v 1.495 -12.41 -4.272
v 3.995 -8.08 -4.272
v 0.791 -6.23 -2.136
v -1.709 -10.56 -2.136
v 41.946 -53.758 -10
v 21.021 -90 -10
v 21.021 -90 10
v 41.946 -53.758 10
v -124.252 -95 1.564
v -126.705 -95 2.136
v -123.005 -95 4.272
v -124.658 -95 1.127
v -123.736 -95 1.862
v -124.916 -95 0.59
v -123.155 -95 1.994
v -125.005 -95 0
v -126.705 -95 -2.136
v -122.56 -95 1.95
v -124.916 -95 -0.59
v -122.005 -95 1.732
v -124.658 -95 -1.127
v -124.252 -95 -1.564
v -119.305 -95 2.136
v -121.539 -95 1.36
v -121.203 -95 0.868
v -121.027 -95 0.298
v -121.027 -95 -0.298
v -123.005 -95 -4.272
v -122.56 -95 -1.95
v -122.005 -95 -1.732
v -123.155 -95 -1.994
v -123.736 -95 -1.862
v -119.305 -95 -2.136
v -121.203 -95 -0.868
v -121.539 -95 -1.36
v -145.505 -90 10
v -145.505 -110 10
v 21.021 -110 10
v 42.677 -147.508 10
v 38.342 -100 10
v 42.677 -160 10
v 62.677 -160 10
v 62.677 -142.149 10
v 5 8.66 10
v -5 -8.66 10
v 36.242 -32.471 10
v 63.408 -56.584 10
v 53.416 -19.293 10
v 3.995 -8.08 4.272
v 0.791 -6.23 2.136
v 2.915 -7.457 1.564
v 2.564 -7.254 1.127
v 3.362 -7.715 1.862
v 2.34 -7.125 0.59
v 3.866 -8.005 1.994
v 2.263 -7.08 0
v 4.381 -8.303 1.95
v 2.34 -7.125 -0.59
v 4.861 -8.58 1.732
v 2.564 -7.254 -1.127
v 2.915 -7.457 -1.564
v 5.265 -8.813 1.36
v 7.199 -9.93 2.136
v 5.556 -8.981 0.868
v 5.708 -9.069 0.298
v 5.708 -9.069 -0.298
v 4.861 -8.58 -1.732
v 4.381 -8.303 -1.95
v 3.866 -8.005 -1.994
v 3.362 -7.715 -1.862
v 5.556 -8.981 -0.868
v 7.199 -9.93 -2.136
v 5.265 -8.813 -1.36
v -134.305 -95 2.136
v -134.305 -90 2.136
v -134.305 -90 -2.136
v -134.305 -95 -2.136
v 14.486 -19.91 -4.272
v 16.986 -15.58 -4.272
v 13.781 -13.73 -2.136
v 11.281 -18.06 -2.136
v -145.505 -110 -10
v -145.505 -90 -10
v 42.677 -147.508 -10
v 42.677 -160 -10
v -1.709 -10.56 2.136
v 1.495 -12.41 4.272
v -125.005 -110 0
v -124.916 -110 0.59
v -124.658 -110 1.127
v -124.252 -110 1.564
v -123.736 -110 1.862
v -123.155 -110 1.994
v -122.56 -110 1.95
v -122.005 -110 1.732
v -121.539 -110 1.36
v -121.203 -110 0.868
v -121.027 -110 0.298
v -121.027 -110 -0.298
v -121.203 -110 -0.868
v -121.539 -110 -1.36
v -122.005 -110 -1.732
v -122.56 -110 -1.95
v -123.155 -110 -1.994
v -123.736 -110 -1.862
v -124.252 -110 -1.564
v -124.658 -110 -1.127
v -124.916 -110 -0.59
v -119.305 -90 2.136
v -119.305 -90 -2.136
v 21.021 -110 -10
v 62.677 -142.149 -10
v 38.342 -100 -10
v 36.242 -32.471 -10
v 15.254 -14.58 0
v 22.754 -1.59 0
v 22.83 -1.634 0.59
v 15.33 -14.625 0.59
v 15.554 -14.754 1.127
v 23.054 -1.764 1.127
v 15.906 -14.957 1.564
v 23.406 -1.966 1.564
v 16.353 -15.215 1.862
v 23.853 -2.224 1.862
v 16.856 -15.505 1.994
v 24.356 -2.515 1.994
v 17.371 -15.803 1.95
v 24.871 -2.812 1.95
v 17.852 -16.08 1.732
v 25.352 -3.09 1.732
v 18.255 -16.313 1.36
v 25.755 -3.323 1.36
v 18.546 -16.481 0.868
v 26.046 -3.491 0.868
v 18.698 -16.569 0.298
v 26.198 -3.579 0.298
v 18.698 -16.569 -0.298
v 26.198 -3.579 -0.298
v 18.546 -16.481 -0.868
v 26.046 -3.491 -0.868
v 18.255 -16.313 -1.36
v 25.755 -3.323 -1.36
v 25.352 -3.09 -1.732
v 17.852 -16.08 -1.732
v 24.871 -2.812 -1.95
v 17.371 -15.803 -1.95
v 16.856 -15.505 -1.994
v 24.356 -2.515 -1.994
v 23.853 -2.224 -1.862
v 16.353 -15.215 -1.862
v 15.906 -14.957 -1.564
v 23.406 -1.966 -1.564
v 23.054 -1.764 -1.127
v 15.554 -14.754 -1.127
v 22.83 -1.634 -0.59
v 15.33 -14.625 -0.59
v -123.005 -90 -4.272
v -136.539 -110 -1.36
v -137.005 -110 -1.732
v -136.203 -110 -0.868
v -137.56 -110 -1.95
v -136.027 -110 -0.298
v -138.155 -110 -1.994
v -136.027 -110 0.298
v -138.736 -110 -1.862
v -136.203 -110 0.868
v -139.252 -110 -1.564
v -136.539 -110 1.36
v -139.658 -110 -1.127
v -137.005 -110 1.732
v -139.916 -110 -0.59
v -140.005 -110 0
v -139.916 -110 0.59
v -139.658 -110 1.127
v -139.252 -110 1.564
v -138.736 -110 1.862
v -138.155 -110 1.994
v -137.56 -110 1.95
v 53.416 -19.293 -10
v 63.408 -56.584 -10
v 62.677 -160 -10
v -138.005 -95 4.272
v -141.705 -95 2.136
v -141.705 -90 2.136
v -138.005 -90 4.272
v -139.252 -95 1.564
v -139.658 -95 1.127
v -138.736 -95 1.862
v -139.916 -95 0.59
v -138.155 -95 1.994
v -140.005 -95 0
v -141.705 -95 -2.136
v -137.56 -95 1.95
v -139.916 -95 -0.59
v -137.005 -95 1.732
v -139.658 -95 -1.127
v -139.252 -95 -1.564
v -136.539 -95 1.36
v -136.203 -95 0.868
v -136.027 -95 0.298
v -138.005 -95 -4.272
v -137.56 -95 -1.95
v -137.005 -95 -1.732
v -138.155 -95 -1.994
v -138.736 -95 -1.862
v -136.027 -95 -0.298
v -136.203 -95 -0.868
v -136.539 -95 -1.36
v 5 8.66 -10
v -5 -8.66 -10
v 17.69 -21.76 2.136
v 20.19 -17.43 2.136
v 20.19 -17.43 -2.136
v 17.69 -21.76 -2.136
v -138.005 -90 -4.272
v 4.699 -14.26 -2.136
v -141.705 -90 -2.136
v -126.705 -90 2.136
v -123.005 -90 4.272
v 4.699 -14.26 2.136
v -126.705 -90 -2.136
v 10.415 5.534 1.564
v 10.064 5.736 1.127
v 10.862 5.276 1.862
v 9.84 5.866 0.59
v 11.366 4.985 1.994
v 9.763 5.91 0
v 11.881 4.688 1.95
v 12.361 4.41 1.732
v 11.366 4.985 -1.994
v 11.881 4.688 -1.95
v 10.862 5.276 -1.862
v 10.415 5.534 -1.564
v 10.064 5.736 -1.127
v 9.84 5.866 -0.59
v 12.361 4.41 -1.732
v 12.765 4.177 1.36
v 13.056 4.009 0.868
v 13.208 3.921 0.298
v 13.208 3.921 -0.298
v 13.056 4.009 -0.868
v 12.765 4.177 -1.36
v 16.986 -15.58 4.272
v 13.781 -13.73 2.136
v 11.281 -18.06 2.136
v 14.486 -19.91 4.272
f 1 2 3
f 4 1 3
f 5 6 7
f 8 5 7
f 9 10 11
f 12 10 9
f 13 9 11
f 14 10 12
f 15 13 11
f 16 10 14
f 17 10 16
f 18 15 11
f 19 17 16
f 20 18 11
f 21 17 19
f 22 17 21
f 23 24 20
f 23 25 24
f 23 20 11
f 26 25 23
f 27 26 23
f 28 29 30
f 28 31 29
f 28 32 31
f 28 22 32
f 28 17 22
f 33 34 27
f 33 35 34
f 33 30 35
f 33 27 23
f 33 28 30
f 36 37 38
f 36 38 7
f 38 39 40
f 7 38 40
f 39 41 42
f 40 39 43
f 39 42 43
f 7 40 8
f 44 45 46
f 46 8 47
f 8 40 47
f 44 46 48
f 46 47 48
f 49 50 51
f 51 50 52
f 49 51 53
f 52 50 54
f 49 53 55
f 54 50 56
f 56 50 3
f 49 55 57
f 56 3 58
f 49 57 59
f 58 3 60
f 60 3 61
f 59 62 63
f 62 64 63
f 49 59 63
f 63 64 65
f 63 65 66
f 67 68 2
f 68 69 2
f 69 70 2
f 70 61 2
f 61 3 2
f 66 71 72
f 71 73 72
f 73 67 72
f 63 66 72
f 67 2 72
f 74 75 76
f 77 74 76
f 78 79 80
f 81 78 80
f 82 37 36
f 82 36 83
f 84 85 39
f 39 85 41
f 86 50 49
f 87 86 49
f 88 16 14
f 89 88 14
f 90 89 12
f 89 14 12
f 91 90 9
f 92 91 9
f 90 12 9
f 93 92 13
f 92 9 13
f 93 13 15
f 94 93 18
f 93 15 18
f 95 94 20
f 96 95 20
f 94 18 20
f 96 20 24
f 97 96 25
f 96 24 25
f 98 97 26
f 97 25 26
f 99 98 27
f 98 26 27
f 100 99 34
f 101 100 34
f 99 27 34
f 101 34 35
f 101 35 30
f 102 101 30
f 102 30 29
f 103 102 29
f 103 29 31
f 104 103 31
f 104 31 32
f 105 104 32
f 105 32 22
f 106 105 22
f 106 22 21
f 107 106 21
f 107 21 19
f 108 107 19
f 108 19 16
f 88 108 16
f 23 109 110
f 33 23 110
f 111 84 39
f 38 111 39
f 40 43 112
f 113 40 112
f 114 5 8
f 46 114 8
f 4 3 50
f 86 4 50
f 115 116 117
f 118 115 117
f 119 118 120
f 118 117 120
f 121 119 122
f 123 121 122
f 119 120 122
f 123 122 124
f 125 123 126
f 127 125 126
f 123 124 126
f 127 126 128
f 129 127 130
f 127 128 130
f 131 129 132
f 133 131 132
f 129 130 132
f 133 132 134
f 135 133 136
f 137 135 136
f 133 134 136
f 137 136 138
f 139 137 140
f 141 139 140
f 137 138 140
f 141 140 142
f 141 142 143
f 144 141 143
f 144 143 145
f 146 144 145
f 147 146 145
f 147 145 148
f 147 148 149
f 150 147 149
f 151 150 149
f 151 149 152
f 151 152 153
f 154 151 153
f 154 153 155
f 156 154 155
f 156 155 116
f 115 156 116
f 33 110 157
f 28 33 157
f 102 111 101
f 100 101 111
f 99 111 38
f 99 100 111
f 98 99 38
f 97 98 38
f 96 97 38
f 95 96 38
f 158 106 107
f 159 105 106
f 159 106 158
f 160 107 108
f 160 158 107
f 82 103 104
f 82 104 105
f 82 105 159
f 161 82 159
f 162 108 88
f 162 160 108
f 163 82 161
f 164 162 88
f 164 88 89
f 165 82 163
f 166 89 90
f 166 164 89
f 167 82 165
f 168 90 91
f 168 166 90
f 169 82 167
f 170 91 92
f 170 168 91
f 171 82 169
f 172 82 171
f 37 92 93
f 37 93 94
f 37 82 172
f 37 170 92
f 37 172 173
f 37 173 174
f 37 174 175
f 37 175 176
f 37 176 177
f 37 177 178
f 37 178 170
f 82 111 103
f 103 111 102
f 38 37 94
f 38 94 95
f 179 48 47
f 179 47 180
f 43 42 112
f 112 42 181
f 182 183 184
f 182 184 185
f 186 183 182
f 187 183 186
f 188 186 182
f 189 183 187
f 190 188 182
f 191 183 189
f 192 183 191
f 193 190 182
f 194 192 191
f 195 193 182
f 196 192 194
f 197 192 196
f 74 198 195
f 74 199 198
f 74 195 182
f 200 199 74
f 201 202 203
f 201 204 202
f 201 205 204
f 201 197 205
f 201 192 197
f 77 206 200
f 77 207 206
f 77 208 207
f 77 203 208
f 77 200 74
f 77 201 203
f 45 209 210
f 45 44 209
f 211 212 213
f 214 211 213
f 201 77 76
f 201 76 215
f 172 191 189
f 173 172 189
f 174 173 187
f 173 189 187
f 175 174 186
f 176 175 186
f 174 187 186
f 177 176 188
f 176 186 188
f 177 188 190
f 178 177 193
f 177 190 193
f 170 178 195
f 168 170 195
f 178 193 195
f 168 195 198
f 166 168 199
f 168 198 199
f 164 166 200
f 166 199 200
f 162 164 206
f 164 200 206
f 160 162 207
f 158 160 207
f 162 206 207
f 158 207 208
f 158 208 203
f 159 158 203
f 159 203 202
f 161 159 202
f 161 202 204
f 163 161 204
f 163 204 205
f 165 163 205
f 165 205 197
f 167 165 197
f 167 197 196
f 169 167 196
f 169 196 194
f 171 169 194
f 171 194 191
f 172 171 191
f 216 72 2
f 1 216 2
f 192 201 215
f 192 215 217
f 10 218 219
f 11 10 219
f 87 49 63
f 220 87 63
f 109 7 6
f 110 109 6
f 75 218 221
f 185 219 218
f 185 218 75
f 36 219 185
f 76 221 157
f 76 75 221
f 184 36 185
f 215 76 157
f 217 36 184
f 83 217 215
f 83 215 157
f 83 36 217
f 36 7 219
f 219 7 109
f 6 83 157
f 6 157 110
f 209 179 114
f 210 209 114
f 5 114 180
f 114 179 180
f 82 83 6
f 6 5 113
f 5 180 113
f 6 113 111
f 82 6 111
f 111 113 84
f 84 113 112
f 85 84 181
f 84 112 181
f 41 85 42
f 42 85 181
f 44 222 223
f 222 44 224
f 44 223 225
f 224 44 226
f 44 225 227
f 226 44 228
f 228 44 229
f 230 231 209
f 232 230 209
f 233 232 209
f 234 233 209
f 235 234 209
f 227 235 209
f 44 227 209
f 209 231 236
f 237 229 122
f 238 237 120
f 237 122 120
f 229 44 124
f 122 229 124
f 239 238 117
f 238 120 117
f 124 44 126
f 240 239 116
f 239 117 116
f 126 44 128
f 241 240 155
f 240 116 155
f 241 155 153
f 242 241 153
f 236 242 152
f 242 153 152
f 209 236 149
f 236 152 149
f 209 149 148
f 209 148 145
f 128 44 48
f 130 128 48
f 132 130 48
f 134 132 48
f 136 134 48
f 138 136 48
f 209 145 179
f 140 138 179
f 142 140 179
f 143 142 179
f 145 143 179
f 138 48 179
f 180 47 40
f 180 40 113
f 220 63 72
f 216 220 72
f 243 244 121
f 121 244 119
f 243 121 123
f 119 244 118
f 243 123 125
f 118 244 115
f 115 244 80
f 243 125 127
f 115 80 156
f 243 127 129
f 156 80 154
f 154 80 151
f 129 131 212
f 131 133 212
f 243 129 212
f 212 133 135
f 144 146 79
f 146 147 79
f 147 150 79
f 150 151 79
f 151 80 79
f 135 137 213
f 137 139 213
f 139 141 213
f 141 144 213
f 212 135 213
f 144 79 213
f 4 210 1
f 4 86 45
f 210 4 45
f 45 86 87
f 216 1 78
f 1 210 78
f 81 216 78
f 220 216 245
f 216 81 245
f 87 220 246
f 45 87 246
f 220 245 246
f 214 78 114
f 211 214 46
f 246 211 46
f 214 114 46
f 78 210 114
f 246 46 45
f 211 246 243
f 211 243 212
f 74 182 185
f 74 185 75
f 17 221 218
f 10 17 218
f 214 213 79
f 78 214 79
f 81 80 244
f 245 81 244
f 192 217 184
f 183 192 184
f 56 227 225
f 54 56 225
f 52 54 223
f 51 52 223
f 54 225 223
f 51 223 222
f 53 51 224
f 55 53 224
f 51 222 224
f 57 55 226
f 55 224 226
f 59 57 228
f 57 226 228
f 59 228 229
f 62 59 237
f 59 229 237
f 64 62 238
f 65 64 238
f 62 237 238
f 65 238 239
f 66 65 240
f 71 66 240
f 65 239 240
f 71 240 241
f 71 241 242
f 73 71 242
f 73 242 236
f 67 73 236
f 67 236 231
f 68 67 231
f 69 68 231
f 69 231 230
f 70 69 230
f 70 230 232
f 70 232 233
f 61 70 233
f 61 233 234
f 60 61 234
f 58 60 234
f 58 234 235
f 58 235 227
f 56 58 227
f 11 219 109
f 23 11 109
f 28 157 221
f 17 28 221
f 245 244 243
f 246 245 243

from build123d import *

# Parameters (mm, degrees)
SKETCH2_W          = 20
SKETCH2_H          = 20
SKETCH4_W          = 20
SKETCH4_H          = 20
CUT_EXTRUDE1_REACH = 228.27
SKETCH5_R          = 2
CUT_EXTRUDE2_START = -15
SKETCH5_3_R        = 2
CUT_EXTRUDE2_DEPTH = 5
CUT_EXTRUDE3_REACH = 204.251
SKETCH6_R          = 2
SKETCH6_5_R        = 2
CUT_EXTRUDE4_DEPTH = 5


with BuildPart() as part:
    # Sweep1: sweep along a path in Sketch1
    with BuildLine(Plane.XY) as sweep1_path:
        Line((0, 0), (44.828773608, -25.88190451))
        Line((44.828773608, -25.88190451), (52.676823753, -55.171226392))
        Line((52.676823753, -55.171226392), (26.794919243, -100))
        Line((26.794919243, -100), (52.676823753, -144.828773608))
        Line((52.676823753, -144.828773608), (52.676823753, -160))
    # Sketch2 → Sweep1 (sweep)
    with BuildSketch(Plane(origin=(0, 0, 0), x_dir=(0, 0, 1), z_dir=(-0.8660254037844382, 0.500000000000001, 0))):
        Rectangle(SKETCH2_W, SKETCH2_H)
    sweep(path=sweep1_path.line, transition=Transition.RIGHT)

    # Sweep3: sweep along a path in Sketch1<5>
    with BuildLine(Plane.XY) as sweep3_path:
        Line((26.794919243, -100), (-145.505080757, -100))
    # Sketch4 → Sweep3 (sweep)
    with BuildSketch(Plane(origin=(-145.505080757, -100, 0), x_dir=(0, 0, 1), z_dir=(-1, 0, 0))):
        Rectangle(SKETCH4_W, SKETCH4_H)
    sweep(path=sweep3_path.line)

    # Sketch5 → Cut-Extrude1 (cut, up to next)
    with BuildSketch(Plane(origin=(5, 8.660254038, 0), x_dir=(0.8660254037844382, -0.500000000000001, 0), z_dir=(0.500000000000001, 0.8660254037844382, 0)), mode=Mode.PRIVATE) as cut_extrude1_sk1:
        with Locations(Location((7.5, 0, 0), (0, 0, 180))):
            Circle(SKETCH5_R)
    cut_extrude1_tool1 = extrude(cut_extrude1_sk1.sketch, amount=-CUT_EXTRUDE1_REACH, mode=Mode.PRIVATE) & part.part
    # Sketch5 → Cut-Extrude1 (cut, up to next)
    with BuildSketch(Plane(origin=(5, 8.660254038, 0), x_dir=(0.8660254037844382, -0.500000000000001, 0), z_dir=(0.500000000000001, 0.8660254037844382, 0)), mode=Mode.PRIVATE) as cut_extrude1_sk2:
        with Locations(Location((22.5, 0, 0), (0, 0, 180))):
            Circle(SKETCH5_R)
    cut_extrude1_tool2 = extrude(cut_extrude1_sk2.sketch, amount=-CUT_EXTRUDE1_REACH, mode=Mode.PRIVATE) & part.part
    add(cut_extrude1_tool1.solids().sort_by_distance((11.495191, 4.910254, 0))[0], mode=Mode.SUBTRACT)
    add(cut_extrude1_tool2.solids().sort_by_distance((24.485572, -2.589746, 0))[0], mode=Mode.SUBTRACT)

    # Sketch5<3> → Cut-Extrude2 (cut)
    # profile 1 of 2: a face of its own
    with BuildSketch(Plane(origin=(5, 8.660254038, 0), x_dir=(0.8660254037844382, -0.500000000000001, 0), z_dir=(0.500000000000001, 0.8660254037844382, 0)).offset(CUT_EXTRUDE2_START)):
        Polygon((11.2, -2.136195996), (11.2, 2.136195996), (7.5, 4.272391992), (3.8, 2.136195996), (3.8, -2.136195996), (7.5, -4.272391992), align=None)
        with Locations(Location((7.5, 0, 0), (0, 0, 180))):
            Circle(SKETCH5_3_R, mode=Mode.SUBTRACT)
    # profile 2 of 2: a face of its own
    with BuildSketch(Plane(origin=(5, 8.660254038, 0), x_dir=(0.8660254037844382, -0.500000000000001, 0), z_dir=(0.500000000000001, 0.8660254037844382, 0)).offset(CUT_EXTRUDE2_START)):
        Polygon((26.2, -2.136195996), (26.2, 2.136195996), (22.5, 4.272391992), (18.8, 2.136195996), (18.8, -2.136195996), (22.5, -4.272391992), align=None)
        with Locations(Location((22.5, 0, 0), (0, 0, 180))):
            Circle(SKETCH5_3_R, mode=Mode.SUBTRACT)
    extrude(amount=-CUT_EXTRUDE2_DEPTH, mode=Mode.SUBTRACT)

    # Sketch6 → Cut-Extrude3 (cut, up to next)
    with BuildSketch(Plane(origin=(0, -90, -90), x_dir=(1, 0, 0), z_dir=(0, 1, 0)), mode=Mode.PRIVATE) as cut_extrude3_sk1:
        with Locations(Location((-138.005080757, -90, 0), (0, 0, 180))):
            Circle(SKETCH6_R)
    cut_extrude3_tool1 = extrude(cut_extrude3_sk1.sketch, amount=-CUT_EXTRUDE3_REACH, mode=Mode.PRIVATE) & part.part
    # Sketch6 → Cut-Extrude3 (cut, up to next)
    with BuildSketch(Plane(origin=(0, -90, -90), x_dir=(1, 0, 0), z_dir=(0, 1, 0)), mode=Mode.PRIVATE) as cut_extrude3_sk2:
        with Locations(Location((-123.005080757, -90, 0), (0, 0, 180))):
            Circle(SKETCH6_R)
    cut_extrude3_tool2 = extrude(cut_extrude3_sk2.sketch, amount=-CUT_EXTRUDE3_REACH, mode=Mode.PRIVATE) & part.part
    add(cut_extrude3_tool1.solids().sort_by_distance((-138.005081, -90, 0))[0], mode=Mode.SUBTRACT)
    add(cut_extrude3_tool2.solids().sort_by_distance((-123.005081, -90, 0))[0], mode=Mode.SUBTRACT)

    # Sketch6<5> → Cut-Extrude4 (cut)
    # profile 1 of 2: a face of its own
    with BuildSketch(Plane(origin=(0, -90, -90), x_dir=(1, 0, 0), z_dir=(0, 1, 0))):
        Polygon((-134.305080757, -92.136195996), (-134.305080757, -87.863804004), (-138.005080757, -85.727608008), (-141.705080757, -87.863804004), (-141.705080757, -92.136195996), (-138.005080757, -94.272391992), align=None)
        with Locations(Location((-138.005080757, -90, 0), (0, 0, 180))):
            Circle(SKETCH6_5_R, mode=Mode.SUBTRACT)
    # profile 2 of 2: a face of its own
    with BuildSketch(Plane(origin=(0, -90, -90), x_dir=(1, 0, 0), z_dir=(0, 1, 0))):
        Polygon((-119.305080757, -92.136195996), (-119.305080757, -87.863804004), (-123.005080757, -85.727608008), (-126.705080757, -87.863804004), (-126.705080757, -92.136195996), (-123.005080757, -94.272391992), align=None)
        with Locations(Location((-123.005080757, -90, 0), (0, 0, 180))):
            Circle(SKETCH6_5_R, mode=Mode.SUBTRACT)
    extrude(amount=-CUT_EXTRUDE4_DEPTH, mode=Mode.SUBTRACT)


solid = part.part
